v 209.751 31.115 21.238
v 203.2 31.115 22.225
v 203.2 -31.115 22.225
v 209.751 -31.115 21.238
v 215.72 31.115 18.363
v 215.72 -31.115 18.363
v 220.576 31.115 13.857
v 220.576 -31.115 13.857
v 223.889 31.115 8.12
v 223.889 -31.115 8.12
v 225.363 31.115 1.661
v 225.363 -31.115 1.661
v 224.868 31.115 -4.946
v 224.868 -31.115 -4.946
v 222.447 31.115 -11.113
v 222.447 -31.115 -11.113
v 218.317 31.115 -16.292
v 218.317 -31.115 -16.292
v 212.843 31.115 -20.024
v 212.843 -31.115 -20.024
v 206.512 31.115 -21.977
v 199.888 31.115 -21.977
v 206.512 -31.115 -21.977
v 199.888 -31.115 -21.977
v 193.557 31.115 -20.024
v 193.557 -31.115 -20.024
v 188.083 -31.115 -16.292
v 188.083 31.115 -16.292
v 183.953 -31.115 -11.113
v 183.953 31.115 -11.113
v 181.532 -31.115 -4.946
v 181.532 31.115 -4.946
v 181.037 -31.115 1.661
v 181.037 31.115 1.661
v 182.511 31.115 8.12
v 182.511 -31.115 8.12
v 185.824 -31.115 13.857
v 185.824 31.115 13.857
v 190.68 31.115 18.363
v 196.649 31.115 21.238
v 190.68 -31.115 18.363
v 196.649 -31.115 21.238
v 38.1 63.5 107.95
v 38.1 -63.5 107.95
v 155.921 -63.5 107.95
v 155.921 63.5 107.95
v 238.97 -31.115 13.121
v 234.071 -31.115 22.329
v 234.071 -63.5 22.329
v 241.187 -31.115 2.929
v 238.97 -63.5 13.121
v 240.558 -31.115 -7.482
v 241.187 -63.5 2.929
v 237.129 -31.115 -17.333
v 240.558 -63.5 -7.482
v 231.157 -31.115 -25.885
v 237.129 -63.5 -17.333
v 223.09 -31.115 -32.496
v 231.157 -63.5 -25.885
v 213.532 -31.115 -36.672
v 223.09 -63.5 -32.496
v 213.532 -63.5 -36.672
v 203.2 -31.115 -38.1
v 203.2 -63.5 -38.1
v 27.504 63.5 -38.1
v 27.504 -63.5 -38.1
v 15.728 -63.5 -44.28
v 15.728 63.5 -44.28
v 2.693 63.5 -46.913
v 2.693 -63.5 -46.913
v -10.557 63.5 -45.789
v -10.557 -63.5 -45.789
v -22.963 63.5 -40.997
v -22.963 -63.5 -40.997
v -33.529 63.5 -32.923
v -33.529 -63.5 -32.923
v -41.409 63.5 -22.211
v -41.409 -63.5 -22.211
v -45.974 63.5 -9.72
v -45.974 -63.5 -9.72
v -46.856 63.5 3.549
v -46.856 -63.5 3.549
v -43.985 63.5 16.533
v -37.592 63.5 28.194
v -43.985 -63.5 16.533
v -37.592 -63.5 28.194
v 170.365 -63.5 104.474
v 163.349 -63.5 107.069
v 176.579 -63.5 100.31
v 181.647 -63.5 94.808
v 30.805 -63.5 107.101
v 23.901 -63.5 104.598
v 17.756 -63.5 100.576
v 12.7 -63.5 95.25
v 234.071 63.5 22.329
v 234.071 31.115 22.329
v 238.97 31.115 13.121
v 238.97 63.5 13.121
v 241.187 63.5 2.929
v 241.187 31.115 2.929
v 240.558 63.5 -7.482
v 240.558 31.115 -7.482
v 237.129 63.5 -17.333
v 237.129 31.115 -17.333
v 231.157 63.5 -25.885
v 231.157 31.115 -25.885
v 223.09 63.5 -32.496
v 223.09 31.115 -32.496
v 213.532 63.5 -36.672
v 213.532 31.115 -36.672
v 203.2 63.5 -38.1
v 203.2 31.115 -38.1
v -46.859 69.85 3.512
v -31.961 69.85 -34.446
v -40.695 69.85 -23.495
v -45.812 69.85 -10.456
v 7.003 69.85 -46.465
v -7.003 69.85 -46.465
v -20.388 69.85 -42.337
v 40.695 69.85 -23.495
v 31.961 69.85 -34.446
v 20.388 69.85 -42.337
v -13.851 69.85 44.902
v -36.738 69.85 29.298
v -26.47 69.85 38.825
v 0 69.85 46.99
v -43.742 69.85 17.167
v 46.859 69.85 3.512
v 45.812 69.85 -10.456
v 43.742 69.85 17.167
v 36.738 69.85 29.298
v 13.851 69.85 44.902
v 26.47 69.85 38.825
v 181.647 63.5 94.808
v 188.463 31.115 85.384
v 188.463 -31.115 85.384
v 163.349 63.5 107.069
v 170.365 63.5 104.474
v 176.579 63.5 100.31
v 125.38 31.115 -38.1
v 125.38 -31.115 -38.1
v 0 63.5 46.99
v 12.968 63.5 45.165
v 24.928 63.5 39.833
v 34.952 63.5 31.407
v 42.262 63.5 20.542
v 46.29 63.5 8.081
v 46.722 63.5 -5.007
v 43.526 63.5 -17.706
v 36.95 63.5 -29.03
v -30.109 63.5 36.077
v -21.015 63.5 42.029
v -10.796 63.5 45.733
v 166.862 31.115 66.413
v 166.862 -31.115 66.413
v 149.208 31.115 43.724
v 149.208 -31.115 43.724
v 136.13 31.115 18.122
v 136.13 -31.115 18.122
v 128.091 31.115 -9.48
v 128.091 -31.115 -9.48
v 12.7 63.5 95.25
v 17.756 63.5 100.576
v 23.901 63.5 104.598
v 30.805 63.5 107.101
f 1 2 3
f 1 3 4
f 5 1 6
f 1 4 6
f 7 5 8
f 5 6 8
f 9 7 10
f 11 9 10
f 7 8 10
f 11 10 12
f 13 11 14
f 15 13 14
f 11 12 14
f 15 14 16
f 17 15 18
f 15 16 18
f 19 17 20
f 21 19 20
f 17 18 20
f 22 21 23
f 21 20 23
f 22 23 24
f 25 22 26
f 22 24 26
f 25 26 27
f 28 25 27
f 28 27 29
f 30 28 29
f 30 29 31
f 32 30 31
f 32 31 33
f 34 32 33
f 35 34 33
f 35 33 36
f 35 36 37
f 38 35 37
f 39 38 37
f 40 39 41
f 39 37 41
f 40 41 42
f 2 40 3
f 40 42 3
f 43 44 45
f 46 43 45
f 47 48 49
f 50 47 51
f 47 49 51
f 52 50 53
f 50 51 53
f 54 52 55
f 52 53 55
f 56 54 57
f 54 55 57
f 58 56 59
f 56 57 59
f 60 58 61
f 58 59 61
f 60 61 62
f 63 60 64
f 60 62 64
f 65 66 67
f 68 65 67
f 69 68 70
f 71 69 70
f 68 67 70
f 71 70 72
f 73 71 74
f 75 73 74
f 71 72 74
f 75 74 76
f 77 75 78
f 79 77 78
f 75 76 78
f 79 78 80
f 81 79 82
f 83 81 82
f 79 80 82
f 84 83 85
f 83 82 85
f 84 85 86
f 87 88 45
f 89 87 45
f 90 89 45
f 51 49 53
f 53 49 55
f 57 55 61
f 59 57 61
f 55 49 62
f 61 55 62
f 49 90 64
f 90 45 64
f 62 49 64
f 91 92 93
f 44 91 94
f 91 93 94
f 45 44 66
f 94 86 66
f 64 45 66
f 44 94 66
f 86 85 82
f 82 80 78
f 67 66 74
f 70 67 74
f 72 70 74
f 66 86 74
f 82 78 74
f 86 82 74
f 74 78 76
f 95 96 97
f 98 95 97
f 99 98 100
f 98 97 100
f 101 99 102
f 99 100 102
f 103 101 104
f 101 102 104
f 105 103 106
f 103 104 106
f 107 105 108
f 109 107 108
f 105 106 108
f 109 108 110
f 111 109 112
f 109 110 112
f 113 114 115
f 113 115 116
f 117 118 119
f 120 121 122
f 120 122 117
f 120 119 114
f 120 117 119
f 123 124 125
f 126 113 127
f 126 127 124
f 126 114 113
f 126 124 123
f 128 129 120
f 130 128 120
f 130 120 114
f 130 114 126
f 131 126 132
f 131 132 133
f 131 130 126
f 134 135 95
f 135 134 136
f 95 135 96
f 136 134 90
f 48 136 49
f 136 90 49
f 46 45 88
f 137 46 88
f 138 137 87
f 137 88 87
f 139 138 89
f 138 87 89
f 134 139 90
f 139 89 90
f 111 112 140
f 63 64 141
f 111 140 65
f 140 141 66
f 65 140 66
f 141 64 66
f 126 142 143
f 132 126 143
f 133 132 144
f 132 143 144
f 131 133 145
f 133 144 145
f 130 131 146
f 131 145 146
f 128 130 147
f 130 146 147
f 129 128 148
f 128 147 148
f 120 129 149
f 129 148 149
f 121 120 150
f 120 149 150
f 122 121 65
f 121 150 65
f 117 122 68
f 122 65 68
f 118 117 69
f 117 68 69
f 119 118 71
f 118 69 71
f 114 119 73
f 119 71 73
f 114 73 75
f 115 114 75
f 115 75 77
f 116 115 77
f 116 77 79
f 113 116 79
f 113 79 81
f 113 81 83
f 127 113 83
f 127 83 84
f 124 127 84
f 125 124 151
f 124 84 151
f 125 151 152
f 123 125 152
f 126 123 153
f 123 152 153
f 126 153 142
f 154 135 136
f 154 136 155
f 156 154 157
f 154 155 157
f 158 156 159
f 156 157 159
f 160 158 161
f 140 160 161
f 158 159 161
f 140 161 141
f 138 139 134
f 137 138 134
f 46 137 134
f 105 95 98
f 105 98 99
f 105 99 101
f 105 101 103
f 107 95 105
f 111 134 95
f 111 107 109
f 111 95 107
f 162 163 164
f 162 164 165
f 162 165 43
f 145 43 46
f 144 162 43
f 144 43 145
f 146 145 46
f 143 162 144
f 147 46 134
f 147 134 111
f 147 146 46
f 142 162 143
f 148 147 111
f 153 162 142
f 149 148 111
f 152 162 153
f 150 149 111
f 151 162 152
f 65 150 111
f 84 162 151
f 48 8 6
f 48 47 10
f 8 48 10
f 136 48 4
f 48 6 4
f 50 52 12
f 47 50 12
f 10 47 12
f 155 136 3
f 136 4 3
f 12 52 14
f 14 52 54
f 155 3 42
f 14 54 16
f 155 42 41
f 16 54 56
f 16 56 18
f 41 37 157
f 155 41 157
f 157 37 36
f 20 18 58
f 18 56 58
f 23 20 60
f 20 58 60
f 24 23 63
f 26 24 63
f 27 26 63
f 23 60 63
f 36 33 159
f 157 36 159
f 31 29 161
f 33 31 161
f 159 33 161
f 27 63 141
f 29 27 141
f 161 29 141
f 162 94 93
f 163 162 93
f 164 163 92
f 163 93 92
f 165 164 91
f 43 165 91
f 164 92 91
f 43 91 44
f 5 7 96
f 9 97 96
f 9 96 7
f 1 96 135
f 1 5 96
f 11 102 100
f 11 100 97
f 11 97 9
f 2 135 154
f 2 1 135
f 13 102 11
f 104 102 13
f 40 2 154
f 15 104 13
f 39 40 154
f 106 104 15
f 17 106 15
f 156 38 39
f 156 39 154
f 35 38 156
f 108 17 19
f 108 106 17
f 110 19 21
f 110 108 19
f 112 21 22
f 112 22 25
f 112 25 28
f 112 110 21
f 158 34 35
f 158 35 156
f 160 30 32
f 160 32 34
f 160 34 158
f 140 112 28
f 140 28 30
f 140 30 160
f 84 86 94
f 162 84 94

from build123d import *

# Parameters (mm, degrees)
BOSS_EXTRUDE2_DEPTH      = 63.5
BOSS_EXTRUDE2_DEPTH_BACK = 63.5
SKETCH3_R                = 46.99
BOSS_EXTRUDE3_DEPTH      = 6.35
CUT_EXTRUDE1_DEPTH       = 31.115
CUT_EXTRUDE1_DEPTH_BACK  = 31.115
BOSS_EXTRUDE4_DEPTH      = 31.115
BOSS_EXTRUDE4_DEPTH_BACK = 31.115
SKETCH5_R                = 22.225


with BuildPart() as part:
    # Sketch2 → Boss-Extrude2 (new, two sides: drawn at the far end of the back side and taken through both)
    with BuildSketch(Plane(origin=(0, 0, 0), x_dir=(0, 0, -1), z_dir=(0, 1, 0)).offset(-BOSS_EXTRUDE2_DEPTH_BACK)):
        with BuildLine():
            Line((-107.95, -38.1), (-107.95, -155.921006071))
            ThreePointArc((-107.95, -155.921006071), (-104.47415367, -170.365199862), (-94.807654535, -181.646823701))
            Line((-94.807654535, -181.646823701), (-22.329185441, -234.070981156))
            ThreePointArc((-22.329185441, -234.070981156), (17.333032549, -237.128984404), (38.1, -203.2))
            Line((38.1, -203.2), (38.1, -27.503637941))
            ThreePointArc((38.1, -27.503637941), (32.92252616, 33.528605269), (-28.194, 37.592))
            Line((-28.194, 37.592), (-95.25, -12.7))
            ThreePointArc((-95.25, -12.7), (-104.598063314, -23.900968343), (-107.95, -38.1))
        make_face()
    extrude(amount=BOSS_EXTRUDE2_DEPTH + BOSS_EXTRUDE2_DEPTH_BACK)

    # Sketch3 → Boss-Extrude3 (add)
    with BuildSketch(Plane(origin=(0, 63.5, 0), x_dir=(1, 0, 0), z_dir=(0, 1, 0))):
        Circle(SKETCH3_R)
    extrude(amount=BOSS_EXTRUDE3_DEPTH)

    # Sketch4 → Cut-Extrude1 (cut, two sides: drawn at the far end of the back side and taken through both)
    with BuildSketch(Plane(origin=(0, 0, 0), x_dir=(1, 0, 0), z_dir=(0, 1, 0)).offset(-CUT_EXTRUDE1_DEPTH_BACK)):
        with BuildLine():
            Line((125.379811821, 38.1), (277.779811821, 38.1))
            Line((277.779811821, 38.1), (188.463070055, -85.383924623))
            ThreePointArc((188.463070055, -85.383924623), (142.063874206, -31.232130195), (125.379811821, 38.1))
        make_face()
    extrude(amount=CUT_EXTRUDE1_DEPTH + CUT_EXTRUDE1_DEPTH_BACK, mode=Mode.SUBTRACT)

    # Sketch5 → Boss-Extrude4 (add, two sides: drawn at the far end of the back side and taken through both)
    with BuildSketch(Plane(origin=(0, 0, 0), x_dir=(1, 0, 0), z_dir=(0, 1, 0)).offset(-BOSS_EXTRUDE4_DEPTH_BACK)):
        with Locations((203.2, 0)):
            Circle(SKETCH5_R)
    extrude(amount=BOSS_EXTRUDE4_DEPTH + BOSS_EXTRUDE4_DEPTH_BACK)


solid = part.part
